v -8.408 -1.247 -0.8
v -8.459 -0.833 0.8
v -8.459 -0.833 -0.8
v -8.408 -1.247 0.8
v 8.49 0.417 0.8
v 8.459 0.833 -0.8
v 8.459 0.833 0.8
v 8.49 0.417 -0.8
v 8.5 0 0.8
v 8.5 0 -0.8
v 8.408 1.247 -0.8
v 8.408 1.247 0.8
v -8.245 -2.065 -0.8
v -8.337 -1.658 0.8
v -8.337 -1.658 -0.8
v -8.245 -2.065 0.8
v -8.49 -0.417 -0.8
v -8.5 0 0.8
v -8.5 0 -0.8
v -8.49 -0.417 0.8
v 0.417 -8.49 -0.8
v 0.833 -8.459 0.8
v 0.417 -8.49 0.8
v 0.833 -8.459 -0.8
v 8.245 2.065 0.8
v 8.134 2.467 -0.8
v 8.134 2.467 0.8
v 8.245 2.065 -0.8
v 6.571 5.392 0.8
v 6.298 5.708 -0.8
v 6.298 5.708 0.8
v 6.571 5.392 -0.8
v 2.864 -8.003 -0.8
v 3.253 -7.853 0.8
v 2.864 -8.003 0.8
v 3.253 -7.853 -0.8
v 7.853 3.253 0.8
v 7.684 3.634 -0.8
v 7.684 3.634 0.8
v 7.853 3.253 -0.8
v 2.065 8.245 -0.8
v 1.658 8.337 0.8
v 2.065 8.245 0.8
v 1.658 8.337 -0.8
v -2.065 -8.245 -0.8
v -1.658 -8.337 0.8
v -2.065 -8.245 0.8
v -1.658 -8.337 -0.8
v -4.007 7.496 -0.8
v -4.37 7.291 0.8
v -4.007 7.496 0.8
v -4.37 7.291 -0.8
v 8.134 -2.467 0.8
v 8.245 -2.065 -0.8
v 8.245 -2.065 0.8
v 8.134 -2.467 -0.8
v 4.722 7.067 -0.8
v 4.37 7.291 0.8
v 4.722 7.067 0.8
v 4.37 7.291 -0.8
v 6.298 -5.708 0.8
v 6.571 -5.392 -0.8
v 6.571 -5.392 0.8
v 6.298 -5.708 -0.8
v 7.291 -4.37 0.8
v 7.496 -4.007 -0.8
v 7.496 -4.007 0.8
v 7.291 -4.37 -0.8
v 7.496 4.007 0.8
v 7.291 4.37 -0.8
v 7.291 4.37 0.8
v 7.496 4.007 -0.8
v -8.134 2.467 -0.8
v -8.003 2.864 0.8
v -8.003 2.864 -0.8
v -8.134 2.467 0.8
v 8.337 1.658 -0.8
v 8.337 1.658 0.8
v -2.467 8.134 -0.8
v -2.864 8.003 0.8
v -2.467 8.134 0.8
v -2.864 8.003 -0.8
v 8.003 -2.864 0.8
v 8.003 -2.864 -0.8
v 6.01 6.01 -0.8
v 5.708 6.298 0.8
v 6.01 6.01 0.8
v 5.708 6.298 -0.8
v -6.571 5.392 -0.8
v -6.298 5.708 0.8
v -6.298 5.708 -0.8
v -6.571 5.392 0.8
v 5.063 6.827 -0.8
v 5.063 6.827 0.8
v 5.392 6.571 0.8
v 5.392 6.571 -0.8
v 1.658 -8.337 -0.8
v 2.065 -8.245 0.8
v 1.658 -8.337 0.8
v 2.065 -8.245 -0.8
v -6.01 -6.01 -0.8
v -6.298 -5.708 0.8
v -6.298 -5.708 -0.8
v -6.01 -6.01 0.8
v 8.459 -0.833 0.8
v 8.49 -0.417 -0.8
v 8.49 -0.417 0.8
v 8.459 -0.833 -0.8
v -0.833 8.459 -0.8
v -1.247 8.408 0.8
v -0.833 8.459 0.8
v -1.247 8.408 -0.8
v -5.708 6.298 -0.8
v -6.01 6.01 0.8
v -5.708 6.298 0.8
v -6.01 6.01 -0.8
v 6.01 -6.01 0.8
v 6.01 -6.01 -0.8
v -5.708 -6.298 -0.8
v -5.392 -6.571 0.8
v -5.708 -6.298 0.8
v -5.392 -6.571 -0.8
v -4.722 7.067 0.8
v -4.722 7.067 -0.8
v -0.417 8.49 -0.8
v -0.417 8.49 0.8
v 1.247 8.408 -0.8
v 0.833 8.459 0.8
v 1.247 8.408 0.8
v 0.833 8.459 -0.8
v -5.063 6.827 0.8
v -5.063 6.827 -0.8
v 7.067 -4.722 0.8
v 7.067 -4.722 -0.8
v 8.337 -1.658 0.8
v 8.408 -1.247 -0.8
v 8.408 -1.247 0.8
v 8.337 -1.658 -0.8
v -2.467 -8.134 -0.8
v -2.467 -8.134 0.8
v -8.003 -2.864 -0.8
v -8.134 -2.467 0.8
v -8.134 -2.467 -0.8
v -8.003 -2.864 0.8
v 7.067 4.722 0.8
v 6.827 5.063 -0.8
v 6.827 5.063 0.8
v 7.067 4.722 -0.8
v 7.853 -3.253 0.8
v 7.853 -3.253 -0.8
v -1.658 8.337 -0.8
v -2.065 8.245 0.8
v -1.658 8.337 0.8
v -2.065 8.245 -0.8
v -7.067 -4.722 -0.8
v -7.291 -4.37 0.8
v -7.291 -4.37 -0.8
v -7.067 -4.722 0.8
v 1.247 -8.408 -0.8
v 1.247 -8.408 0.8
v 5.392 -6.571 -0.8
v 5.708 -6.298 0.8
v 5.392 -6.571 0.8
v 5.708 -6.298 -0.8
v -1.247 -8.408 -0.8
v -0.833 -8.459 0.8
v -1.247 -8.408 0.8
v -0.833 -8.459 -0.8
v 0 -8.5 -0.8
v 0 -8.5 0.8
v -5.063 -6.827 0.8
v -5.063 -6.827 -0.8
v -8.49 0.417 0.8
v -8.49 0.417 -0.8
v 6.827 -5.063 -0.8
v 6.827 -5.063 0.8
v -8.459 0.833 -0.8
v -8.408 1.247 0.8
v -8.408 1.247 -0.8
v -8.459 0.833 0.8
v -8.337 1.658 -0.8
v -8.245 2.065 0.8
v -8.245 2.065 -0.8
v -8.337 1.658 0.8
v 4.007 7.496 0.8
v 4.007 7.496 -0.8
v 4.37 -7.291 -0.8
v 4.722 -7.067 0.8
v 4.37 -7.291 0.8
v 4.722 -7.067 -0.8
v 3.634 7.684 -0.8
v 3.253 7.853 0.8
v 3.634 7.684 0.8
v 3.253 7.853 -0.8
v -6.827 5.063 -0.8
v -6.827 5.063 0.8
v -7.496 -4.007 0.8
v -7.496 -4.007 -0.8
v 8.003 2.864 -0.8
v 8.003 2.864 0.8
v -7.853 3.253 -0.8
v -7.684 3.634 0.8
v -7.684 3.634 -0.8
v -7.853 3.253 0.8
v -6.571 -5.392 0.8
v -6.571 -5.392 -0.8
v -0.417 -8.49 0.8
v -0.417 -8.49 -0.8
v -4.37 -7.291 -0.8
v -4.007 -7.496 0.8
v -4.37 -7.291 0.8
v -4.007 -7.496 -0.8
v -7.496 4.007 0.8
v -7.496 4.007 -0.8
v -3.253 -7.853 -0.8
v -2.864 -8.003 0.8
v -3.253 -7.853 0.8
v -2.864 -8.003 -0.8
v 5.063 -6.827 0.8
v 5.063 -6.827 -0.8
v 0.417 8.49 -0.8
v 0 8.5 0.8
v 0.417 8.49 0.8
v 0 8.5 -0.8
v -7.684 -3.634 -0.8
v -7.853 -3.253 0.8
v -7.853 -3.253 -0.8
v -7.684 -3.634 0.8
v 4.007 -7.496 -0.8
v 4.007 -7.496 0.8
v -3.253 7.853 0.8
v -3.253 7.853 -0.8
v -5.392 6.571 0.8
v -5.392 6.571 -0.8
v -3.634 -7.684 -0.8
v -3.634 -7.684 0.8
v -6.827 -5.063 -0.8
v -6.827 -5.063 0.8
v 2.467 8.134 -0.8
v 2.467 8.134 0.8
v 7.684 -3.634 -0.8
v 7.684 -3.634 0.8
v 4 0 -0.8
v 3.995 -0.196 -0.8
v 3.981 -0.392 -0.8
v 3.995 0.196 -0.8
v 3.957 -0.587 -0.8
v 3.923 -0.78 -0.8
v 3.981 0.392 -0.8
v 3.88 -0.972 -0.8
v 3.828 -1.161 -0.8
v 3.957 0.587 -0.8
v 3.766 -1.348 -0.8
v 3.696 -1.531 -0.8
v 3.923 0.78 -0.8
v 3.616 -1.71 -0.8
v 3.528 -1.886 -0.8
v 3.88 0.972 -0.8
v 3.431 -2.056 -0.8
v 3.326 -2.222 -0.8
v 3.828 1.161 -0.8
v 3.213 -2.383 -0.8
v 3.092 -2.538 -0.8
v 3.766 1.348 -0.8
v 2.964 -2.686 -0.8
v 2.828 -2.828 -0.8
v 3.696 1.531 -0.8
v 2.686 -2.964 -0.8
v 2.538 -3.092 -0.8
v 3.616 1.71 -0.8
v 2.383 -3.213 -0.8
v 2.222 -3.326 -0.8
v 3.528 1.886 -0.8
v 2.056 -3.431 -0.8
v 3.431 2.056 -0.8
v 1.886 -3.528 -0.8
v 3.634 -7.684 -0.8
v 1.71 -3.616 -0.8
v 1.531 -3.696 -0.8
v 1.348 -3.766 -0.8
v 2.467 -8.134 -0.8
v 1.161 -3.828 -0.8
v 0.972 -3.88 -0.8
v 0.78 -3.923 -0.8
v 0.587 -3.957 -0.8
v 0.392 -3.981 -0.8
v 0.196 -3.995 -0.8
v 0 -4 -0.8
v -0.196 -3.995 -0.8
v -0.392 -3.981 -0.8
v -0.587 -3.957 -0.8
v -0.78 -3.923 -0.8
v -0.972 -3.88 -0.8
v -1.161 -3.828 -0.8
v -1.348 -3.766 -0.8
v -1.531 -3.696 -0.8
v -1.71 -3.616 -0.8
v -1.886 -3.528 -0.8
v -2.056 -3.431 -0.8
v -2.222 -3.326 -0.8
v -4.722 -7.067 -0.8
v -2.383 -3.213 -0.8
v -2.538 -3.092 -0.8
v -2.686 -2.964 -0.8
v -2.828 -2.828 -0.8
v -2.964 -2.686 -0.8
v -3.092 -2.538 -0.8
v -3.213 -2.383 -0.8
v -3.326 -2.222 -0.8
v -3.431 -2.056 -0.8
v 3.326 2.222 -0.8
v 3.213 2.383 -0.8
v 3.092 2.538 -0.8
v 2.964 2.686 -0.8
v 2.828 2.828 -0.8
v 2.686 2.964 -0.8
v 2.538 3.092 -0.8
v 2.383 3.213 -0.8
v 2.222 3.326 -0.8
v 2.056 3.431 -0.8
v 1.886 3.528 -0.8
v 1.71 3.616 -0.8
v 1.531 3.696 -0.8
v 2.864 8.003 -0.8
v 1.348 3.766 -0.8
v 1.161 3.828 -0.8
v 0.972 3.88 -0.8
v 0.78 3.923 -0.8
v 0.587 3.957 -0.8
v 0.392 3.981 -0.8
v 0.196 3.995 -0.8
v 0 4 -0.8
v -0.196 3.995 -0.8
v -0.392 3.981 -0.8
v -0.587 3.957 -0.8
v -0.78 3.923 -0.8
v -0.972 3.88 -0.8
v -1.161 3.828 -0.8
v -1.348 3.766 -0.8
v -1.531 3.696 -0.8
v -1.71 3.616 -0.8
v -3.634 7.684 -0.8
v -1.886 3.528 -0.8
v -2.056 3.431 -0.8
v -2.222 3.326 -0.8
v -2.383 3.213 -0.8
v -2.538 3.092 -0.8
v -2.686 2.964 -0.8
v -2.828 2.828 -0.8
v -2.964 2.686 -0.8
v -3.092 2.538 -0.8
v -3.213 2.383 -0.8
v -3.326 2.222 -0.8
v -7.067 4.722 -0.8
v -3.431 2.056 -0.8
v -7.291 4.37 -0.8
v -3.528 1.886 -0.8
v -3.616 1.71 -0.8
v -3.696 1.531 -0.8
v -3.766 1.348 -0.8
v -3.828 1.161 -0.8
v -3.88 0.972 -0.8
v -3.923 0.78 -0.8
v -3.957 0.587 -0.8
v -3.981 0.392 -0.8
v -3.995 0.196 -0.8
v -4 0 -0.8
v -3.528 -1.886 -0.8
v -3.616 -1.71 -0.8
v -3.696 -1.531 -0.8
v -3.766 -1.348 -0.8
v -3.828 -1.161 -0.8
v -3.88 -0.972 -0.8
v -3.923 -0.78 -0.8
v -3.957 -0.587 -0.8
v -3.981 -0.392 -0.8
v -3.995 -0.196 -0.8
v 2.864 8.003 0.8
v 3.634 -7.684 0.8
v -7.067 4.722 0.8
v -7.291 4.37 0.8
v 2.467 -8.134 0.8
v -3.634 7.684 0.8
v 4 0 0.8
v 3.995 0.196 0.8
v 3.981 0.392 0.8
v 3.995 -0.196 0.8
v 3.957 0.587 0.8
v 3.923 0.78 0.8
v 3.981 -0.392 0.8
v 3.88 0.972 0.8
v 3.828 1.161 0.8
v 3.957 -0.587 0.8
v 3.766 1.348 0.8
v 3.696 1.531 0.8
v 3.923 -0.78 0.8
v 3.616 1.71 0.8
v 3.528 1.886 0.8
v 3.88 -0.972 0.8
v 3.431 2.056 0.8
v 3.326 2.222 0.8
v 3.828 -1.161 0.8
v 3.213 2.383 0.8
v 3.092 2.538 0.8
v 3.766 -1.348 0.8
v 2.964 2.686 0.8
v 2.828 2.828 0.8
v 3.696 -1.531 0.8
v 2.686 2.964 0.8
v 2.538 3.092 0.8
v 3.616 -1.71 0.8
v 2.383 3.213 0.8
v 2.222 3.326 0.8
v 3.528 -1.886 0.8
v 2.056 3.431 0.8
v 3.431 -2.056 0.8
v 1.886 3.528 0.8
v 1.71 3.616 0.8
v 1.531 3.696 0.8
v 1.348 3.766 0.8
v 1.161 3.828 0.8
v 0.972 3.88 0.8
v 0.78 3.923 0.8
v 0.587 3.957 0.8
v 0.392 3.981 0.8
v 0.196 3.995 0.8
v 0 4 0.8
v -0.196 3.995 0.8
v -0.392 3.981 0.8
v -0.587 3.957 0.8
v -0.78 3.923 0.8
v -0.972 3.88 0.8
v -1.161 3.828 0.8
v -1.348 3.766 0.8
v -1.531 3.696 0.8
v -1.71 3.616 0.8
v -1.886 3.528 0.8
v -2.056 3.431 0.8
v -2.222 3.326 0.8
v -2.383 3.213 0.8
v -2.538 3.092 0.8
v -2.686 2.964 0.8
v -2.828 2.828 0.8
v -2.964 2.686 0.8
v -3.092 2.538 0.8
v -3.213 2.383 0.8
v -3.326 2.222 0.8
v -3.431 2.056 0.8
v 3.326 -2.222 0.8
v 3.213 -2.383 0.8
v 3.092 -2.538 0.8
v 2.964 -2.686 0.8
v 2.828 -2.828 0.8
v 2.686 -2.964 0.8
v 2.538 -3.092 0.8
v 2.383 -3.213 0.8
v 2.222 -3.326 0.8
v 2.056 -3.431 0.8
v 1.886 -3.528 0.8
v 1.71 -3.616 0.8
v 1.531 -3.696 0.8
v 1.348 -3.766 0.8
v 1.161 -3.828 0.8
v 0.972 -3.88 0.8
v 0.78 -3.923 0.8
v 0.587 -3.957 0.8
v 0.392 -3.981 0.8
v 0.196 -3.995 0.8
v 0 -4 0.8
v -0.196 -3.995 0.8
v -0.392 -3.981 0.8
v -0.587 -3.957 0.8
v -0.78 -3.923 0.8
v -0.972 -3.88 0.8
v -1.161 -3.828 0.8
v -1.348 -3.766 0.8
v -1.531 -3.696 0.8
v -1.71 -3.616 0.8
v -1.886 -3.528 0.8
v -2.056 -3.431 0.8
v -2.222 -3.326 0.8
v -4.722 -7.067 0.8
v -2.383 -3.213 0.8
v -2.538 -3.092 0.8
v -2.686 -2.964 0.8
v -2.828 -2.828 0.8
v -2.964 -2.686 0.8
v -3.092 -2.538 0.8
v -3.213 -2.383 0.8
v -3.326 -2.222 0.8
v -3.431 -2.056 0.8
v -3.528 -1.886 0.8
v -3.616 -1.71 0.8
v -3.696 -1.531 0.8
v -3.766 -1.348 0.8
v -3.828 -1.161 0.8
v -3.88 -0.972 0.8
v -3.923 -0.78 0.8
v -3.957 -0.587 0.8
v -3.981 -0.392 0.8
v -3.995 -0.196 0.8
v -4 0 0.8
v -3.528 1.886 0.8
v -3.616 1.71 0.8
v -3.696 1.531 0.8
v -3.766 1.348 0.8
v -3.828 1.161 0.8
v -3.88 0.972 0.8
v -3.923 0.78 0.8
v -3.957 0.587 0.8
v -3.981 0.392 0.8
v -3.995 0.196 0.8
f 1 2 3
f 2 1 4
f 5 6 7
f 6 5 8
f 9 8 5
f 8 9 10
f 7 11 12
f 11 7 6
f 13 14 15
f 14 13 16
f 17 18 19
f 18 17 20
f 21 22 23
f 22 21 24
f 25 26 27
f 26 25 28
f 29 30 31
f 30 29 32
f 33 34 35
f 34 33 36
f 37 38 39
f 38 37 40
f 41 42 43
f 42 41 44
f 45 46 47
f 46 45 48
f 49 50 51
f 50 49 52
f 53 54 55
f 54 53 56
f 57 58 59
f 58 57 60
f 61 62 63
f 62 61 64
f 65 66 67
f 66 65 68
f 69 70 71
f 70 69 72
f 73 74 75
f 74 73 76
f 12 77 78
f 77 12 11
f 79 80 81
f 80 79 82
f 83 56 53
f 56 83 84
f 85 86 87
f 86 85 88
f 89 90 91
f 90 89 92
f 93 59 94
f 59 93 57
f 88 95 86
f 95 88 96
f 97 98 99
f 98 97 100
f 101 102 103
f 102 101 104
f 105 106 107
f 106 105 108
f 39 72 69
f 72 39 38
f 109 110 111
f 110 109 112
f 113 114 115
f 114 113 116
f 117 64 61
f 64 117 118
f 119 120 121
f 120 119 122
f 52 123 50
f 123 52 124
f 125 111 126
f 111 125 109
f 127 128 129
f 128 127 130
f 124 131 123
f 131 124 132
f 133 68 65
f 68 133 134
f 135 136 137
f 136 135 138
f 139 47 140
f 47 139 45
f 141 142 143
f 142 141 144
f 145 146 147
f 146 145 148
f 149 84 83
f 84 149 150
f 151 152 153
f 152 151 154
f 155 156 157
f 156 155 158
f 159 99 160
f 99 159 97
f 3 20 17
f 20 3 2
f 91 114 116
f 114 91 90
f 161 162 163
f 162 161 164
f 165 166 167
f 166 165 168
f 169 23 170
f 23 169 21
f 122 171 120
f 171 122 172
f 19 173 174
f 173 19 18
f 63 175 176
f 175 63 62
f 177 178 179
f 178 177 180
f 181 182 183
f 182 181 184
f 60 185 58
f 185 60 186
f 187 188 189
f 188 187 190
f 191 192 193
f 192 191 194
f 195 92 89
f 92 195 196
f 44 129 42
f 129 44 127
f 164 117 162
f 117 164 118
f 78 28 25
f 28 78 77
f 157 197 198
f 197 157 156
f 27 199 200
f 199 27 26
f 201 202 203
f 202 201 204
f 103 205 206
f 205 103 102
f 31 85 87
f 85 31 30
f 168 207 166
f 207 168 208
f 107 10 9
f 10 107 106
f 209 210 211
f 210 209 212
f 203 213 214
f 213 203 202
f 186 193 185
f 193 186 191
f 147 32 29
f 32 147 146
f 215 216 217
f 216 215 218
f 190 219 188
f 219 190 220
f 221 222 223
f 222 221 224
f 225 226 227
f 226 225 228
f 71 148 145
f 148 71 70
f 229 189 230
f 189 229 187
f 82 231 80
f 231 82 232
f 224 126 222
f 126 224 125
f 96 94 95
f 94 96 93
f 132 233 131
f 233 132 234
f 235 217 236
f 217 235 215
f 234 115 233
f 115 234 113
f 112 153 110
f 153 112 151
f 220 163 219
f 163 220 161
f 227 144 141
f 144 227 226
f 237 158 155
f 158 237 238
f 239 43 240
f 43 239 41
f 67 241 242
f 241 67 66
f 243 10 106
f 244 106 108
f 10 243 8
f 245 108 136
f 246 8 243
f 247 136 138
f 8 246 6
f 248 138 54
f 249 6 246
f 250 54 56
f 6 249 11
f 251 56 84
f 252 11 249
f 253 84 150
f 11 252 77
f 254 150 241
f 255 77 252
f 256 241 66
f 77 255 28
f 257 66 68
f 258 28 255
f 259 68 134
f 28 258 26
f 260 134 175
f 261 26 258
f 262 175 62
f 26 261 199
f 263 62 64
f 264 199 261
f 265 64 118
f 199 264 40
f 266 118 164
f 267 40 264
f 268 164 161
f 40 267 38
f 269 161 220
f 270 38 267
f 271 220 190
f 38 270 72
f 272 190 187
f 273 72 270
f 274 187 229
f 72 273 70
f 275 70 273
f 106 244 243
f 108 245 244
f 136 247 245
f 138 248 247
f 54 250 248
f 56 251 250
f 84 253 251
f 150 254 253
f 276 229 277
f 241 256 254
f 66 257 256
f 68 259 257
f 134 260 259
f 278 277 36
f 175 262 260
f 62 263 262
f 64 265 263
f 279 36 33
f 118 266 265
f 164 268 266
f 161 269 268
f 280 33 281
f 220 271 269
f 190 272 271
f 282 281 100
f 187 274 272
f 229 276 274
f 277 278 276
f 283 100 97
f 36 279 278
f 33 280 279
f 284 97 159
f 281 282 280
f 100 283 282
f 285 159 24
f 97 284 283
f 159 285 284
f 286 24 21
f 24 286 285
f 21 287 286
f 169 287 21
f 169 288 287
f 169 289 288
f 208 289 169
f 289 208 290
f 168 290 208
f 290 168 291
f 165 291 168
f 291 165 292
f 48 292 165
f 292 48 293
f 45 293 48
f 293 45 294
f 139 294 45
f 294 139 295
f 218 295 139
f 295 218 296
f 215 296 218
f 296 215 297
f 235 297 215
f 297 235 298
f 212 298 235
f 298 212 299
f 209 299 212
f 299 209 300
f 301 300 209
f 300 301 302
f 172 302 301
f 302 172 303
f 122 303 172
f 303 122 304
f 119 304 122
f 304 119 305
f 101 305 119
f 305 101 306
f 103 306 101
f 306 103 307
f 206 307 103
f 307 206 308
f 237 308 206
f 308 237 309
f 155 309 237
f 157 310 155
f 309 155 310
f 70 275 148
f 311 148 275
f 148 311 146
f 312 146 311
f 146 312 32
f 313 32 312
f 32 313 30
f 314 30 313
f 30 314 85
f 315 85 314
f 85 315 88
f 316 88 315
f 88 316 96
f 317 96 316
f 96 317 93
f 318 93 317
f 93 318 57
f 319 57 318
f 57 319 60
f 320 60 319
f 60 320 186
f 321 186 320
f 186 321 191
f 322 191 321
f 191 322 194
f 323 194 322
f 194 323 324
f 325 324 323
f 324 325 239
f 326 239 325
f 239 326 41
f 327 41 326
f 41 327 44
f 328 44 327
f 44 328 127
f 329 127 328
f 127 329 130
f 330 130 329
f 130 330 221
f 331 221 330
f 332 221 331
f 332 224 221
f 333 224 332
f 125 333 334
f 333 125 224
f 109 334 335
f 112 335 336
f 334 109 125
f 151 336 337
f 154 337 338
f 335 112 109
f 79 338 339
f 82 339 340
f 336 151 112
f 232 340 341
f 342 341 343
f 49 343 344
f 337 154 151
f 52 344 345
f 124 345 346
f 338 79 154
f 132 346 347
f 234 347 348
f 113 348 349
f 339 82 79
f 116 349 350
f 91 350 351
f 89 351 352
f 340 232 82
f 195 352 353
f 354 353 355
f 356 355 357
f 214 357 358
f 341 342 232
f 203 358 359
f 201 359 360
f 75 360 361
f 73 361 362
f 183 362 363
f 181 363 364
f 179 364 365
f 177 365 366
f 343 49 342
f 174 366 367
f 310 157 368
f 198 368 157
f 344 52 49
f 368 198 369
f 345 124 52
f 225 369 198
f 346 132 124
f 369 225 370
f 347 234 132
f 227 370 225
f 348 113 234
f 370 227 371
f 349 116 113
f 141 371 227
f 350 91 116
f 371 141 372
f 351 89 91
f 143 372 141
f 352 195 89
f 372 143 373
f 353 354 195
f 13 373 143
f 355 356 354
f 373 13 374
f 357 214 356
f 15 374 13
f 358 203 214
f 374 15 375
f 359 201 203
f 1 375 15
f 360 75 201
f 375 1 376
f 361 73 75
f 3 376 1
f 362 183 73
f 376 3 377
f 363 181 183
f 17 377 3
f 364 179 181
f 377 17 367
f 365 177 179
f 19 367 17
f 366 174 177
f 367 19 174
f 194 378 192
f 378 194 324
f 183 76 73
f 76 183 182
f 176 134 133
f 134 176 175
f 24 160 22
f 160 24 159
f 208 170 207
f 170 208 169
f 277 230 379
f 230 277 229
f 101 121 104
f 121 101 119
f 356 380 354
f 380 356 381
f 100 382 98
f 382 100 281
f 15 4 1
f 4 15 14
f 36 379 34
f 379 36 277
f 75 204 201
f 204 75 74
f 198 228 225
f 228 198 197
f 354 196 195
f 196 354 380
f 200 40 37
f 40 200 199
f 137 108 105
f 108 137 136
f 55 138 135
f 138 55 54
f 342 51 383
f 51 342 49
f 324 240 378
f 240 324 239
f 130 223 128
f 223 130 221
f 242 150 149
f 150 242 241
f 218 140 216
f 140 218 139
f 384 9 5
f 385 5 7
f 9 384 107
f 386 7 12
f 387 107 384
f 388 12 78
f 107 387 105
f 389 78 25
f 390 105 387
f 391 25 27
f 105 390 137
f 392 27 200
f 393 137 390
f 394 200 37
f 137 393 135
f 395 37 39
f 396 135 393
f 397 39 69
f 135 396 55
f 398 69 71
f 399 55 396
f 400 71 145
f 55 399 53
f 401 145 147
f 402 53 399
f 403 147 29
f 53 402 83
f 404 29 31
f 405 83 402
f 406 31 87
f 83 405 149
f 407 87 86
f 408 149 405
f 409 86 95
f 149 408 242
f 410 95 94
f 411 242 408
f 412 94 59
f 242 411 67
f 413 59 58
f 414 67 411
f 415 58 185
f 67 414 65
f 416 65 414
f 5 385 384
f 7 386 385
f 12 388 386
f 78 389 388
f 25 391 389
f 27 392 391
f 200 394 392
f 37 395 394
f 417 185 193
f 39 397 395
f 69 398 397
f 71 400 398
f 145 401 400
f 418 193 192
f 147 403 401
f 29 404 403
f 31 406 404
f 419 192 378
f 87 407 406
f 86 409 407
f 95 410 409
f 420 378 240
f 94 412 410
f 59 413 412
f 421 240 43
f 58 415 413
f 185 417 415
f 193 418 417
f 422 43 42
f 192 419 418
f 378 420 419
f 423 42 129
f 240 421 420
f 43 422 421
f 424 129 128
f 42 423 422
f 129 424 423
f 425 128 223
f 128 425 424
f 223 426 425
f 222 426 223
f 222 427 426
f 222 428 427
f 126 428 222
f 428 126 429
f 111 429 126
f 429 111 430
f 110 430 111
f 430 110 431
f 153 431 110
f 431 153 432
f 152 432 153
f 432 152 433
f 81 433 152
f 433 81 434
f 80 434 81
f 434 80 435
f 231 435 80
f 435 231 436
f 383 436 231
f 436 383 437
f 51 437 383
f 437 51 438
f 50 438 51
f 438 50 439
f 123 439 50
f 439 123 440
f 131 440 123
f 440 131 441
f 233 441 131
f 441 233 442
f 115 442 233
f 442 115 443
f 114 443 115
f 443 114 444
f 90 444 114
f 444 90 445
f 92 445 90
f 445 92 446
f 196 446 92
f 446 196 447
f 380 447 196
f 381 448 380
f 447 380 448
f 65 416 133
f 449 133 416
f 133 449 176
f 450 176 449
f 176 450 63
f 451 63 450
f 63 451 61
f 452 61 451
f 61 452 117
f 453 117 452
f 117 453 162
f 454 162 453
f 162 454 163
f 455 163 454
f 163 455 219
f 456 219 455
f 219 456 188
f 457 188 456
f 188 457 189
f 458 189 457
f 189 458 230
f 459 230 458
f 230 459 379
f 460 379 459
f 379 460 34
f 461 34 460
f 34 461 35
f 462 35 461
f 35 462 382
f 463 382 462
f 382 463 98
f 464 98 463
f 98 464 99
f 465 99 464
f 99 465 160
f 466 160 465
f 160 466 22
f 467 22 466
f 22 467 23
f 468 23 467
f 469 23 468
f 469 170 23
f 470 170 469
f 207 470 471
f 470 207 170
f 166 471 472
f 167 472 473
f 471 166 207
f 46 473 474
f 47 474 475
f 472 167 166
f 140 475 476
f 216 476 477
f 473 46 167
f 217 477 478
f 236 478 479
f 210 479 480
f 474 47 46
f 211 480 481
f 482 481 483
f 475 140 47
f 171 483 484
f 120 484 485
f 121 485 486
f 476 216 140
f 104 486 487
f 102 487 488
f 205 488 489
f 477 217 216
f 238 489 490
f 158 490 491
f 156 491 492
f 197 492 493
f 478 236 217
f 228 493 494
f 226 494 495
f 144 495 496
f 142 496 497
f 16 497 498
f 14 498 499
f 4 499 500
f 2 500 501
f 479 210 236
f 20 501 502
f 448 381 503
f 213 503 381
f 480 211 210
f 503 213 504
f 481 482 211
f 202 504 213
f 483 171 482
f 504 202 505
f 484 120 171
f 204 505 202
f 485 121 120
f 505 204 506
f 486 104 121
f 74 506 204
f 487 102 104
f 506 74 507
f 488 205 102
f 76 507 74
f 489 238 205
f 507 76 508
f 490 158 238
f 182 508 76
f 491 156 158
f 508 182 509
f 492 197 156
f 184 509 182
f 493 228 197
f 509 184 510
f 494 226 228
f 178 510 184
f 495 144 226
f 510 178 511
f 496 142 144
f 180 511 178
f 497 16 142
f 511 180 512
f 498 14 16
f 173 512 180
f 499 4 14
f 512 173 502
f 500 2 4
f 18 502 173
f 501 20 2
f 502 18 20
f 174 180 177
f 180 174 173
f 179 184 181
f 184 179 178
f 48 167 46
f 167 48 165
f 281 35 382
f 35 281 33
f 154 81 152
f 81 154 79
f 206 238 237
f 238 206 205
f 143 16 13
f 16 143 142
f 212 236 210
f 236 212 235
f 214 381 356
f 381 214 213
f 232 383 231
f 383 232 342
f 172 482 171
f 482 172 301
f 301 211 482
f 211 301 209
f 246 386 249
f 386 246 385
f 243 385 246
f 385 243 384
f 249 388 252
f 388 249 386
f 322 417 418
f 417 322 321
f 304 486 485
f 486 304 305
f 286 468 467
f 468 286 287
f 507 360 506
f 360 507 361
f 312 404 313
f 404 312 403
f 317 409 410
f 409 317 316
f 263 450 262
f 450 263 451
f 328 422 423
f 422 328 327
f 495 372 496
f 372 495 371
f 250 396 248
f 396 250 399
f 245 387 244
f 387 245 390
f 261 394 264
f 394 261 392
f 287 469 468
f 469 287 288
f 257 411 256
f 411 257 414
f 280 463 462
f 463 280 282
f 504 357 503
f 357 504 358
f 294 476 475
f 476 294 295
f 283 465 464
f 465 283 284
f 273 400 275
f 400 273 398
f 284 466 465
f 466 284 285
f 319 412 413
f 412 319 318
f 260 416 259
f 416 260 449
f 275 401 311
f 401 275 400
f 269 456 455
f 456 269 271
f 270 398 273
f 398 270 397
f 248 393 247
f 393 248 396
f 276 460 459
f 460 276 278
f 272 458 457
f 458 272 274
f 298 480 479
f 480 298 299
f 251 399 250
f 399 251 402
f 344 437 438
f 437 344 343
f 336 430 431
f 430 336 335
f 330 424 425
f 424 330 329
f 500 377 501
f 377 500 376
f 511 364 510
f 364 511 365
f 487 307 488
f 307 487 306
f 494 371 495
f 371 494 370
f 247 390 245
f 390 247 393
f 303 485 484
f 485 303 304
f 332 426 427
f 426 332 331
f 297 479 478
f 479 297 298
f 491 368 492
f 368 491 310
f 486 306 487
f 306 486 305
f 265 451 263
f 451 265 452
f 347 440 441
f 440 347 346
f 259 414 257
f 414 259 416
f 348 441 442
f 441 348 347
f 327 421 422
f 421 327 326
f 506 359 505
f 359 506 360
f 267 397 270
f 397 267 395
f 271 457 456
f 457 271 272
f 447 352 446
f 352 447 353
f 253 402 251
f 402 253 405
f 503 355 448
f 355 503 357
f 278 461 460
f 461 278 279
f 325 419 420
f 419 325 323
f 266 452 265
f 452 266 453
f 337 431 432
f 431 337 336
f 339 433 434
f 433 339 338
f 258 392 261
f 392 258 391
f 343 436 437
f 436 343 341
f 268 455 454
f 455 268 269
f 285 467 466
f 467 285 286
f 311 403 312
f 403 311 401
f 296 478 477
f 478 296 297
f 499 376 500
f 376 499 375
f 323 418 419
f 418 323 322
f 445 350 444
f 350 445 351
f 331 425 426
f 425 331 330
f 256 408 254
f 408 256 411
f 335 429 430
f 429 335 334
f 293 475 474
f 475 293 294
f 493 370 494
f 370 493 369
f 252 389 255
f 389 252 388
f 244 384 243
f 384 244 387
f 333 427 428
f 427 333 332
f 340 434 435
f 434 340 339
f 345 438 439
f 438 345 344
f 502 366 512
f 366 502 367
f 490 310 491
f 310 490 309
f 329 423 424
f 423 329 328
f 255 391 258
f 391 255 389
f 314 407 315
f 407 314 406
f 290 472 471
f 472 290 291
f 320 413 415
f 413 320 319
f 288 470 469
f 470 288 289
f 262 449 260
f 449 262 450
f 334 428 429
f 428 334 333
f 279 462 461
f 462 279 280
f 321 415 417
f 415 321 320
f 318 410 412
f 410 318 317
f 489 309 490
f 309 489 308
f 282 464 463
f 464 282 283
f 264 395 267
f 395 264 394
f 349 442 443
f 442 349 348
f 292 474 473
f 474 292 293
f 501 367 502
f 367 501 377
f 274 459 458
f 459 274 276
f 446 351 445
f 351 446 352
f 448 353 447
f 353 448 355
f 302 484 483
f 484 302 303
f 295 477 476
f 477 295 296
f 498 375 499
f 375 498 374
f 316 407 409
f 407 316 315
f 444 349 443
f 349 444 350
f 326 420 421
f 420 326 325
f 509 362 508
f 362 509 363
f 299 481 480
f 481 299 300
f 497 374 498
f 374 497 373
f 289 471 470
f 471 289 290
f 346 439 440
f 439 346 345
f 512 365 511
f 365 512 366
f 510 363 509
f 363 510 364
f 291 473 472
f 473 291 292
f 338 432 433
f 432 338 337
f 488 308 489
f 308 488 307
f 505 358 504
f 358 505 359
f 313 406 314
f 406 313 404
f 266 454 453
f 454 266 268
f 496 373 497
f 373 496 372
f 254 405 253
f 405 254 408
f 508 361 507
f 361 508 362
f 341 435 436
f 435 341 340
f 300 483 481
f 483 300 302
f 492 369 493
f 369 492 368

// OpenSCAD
// Flat washer parameters (mm)
inner_diameter_mm = 8.0;   // inner hole diameter
outer_diameter_mm = 17.0;  // outer diameter
thickness_mm      = 1.6;   // thickness

// Small extra height to guarantee a clean through-hole in CSG
hole_extra_mm = 0.2;

module flat_washer() {
    difference() {
        cylinder(d=outer_diameter_mm, h=thickness_mm, center=true, $fn=128);
        cylinder(d=inner_diameter_mm, h=thickness_mm + 2*hole_extra_mm, center=true, $fn=128);
    }
}

flat_washer();
